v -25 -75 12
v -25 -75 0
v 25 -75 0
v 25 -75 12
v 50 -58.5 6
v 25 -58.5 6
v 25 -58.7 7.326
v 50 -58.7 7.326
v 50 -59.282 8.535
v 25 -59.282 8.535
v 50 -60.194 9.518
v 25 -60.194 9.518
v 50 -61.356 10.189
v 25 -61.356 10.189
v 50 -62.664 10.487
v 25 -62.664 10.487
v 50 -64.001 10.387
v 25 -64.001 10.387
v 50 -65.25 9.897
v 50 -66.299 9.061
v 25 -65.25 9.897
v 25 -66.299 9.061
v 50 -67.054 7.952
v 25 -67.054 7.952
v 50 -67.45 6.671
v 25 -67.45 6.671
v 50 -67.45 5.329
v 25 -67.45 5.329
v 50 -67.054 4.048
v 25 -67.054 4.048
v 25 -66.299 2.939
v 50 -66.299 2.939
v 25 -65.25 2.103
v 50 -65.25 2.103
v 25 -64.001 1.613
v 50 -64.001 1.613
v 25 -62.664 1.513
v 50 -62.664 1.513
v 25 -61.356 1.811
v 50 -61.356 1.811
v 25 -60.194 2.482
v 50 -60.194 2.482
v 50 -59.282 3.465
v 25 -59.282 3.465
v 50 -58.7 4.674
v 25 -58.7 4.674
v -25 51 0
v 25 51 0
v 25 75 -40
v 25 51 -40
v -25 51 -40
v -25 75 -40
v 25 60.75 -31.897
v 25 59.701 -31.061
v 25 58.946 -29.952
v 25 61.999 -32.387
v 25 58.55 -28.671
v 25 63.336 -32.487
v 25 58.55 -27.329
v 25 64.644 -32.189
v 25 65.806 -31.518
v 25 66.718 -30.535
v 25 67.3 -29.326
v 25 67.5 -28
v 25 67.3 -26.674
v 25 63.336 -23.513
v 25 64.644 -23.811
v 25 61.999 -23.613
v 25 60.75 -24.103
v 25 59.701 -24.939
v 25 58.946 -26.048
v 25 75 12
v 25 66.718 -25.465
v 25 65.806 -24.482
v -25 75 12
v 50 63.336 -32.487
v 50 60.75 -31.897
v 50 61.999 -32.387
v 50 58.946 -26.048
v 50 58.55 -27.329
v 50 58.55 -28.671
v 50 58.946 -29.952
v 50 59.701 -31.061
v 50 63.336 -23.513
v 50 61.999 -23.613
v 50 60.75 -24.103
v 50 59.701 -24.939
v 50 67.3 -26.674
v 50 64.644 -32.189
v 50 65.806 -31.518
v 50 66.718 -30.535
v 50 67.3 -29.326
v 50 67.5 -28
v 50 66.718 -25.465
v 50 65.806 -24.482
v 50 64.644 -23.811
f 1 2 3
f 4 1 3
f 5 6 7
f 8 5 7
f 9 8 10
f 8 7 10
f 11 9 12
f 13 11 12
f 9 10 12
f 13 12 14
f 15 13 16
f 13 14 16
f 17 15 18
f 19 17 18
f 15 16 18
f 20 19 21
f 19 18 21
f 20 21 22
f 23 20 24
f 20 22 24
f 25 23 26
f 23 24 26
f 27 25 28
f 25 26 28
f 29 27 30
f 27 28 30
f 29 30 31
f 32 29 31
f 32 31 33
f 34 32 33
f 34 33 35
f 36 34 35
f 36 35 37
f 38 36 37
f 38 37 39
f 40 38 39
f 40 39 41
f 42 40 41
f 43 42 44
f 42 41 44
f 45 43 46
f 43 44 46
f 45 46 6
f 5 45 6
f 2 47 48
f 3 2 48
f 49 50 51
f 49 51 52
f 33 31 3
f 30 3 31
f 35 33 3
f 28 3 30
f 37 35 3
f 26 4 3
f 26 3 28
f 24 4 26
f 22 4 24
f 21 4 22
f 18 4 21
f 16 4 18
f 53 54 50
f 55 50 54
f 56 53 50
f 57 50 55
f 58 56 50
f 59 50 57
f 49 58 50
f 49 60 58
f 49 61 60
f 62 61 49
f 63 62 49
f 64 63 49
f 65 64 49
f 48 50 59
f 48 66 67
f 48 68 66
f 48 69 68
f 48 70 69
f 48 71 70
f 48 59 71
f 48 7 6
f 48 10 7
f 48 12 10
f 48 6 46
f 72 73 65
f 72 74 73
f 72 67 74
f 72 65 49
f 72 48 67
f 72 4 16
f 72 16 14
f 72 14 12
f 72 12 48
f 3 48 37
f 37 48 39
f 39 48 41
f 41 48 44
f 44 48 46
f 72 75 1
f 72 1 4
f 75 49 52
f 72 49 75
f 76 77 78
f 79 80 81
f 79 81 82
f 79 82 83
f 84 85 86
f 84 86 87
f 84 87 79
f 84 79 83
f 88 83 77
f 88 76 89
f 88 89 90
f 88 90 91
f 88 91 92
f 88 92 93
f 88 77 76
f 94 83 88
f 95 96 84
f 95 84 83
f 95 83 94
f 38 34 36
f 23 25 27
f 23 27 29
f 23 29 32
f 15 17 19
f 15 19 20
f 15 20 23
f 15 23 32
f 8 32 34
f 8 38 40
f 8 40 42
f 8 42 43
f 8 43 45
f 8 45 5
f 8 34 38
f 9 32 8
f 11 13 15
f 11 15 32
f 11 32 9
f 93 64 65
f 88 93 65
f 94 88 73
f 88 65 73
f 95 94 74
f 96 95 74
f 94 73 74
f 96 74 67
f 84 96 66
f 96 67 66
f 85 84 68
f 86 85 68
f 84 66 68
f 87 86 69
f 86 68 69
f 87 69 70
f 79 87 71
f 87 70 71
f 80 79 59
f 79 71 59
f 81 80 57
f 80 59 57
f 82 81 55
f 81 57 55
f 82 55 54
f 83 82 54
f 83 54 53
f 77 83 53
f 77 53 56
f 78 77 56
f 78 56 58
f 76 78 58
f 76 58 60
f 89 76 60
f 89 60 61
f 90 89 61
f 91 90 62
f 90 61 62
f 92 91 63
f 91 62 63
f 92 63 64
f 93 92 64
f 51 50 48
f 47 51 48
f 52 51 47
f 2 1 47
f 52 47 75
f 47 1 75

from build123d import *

# Parameters (mm, degrees)
F0_W     = 50
F0_H     = 150
F1_DEPTH = 12
F2_W     = 24
F2_H     = 40
F3_DEPTH = 50
F4_R     = 4.5
F5_DEPTH = 25


with BuildPart() as f1:
    # F0 (on Top) → F1 (new body)
    with BuildSketch(Plane.XY):
        Rectangle(F0_W, F0_H)
    extrude(amount=F1_DEPTH)

    # F2 (on face) → F3 (join)
    with BuildSketch(Plane.YZ.offset(25)):
        with Locations((63, -20)):
            Rectangle(F2_W, F2_H)
    extrude(amount=-F3_DEPTH)

    # F4 (on face) → F5 (join)
    with BuildSketch(Plane.YZ.offset(25)):
        with Locations((-63, 6)):
            Circle(F4_R)
        with Locations((63, -28)):
            Circle(F4_R)
    extrude(amount=F5_DEPTH)


solid = f1.part
